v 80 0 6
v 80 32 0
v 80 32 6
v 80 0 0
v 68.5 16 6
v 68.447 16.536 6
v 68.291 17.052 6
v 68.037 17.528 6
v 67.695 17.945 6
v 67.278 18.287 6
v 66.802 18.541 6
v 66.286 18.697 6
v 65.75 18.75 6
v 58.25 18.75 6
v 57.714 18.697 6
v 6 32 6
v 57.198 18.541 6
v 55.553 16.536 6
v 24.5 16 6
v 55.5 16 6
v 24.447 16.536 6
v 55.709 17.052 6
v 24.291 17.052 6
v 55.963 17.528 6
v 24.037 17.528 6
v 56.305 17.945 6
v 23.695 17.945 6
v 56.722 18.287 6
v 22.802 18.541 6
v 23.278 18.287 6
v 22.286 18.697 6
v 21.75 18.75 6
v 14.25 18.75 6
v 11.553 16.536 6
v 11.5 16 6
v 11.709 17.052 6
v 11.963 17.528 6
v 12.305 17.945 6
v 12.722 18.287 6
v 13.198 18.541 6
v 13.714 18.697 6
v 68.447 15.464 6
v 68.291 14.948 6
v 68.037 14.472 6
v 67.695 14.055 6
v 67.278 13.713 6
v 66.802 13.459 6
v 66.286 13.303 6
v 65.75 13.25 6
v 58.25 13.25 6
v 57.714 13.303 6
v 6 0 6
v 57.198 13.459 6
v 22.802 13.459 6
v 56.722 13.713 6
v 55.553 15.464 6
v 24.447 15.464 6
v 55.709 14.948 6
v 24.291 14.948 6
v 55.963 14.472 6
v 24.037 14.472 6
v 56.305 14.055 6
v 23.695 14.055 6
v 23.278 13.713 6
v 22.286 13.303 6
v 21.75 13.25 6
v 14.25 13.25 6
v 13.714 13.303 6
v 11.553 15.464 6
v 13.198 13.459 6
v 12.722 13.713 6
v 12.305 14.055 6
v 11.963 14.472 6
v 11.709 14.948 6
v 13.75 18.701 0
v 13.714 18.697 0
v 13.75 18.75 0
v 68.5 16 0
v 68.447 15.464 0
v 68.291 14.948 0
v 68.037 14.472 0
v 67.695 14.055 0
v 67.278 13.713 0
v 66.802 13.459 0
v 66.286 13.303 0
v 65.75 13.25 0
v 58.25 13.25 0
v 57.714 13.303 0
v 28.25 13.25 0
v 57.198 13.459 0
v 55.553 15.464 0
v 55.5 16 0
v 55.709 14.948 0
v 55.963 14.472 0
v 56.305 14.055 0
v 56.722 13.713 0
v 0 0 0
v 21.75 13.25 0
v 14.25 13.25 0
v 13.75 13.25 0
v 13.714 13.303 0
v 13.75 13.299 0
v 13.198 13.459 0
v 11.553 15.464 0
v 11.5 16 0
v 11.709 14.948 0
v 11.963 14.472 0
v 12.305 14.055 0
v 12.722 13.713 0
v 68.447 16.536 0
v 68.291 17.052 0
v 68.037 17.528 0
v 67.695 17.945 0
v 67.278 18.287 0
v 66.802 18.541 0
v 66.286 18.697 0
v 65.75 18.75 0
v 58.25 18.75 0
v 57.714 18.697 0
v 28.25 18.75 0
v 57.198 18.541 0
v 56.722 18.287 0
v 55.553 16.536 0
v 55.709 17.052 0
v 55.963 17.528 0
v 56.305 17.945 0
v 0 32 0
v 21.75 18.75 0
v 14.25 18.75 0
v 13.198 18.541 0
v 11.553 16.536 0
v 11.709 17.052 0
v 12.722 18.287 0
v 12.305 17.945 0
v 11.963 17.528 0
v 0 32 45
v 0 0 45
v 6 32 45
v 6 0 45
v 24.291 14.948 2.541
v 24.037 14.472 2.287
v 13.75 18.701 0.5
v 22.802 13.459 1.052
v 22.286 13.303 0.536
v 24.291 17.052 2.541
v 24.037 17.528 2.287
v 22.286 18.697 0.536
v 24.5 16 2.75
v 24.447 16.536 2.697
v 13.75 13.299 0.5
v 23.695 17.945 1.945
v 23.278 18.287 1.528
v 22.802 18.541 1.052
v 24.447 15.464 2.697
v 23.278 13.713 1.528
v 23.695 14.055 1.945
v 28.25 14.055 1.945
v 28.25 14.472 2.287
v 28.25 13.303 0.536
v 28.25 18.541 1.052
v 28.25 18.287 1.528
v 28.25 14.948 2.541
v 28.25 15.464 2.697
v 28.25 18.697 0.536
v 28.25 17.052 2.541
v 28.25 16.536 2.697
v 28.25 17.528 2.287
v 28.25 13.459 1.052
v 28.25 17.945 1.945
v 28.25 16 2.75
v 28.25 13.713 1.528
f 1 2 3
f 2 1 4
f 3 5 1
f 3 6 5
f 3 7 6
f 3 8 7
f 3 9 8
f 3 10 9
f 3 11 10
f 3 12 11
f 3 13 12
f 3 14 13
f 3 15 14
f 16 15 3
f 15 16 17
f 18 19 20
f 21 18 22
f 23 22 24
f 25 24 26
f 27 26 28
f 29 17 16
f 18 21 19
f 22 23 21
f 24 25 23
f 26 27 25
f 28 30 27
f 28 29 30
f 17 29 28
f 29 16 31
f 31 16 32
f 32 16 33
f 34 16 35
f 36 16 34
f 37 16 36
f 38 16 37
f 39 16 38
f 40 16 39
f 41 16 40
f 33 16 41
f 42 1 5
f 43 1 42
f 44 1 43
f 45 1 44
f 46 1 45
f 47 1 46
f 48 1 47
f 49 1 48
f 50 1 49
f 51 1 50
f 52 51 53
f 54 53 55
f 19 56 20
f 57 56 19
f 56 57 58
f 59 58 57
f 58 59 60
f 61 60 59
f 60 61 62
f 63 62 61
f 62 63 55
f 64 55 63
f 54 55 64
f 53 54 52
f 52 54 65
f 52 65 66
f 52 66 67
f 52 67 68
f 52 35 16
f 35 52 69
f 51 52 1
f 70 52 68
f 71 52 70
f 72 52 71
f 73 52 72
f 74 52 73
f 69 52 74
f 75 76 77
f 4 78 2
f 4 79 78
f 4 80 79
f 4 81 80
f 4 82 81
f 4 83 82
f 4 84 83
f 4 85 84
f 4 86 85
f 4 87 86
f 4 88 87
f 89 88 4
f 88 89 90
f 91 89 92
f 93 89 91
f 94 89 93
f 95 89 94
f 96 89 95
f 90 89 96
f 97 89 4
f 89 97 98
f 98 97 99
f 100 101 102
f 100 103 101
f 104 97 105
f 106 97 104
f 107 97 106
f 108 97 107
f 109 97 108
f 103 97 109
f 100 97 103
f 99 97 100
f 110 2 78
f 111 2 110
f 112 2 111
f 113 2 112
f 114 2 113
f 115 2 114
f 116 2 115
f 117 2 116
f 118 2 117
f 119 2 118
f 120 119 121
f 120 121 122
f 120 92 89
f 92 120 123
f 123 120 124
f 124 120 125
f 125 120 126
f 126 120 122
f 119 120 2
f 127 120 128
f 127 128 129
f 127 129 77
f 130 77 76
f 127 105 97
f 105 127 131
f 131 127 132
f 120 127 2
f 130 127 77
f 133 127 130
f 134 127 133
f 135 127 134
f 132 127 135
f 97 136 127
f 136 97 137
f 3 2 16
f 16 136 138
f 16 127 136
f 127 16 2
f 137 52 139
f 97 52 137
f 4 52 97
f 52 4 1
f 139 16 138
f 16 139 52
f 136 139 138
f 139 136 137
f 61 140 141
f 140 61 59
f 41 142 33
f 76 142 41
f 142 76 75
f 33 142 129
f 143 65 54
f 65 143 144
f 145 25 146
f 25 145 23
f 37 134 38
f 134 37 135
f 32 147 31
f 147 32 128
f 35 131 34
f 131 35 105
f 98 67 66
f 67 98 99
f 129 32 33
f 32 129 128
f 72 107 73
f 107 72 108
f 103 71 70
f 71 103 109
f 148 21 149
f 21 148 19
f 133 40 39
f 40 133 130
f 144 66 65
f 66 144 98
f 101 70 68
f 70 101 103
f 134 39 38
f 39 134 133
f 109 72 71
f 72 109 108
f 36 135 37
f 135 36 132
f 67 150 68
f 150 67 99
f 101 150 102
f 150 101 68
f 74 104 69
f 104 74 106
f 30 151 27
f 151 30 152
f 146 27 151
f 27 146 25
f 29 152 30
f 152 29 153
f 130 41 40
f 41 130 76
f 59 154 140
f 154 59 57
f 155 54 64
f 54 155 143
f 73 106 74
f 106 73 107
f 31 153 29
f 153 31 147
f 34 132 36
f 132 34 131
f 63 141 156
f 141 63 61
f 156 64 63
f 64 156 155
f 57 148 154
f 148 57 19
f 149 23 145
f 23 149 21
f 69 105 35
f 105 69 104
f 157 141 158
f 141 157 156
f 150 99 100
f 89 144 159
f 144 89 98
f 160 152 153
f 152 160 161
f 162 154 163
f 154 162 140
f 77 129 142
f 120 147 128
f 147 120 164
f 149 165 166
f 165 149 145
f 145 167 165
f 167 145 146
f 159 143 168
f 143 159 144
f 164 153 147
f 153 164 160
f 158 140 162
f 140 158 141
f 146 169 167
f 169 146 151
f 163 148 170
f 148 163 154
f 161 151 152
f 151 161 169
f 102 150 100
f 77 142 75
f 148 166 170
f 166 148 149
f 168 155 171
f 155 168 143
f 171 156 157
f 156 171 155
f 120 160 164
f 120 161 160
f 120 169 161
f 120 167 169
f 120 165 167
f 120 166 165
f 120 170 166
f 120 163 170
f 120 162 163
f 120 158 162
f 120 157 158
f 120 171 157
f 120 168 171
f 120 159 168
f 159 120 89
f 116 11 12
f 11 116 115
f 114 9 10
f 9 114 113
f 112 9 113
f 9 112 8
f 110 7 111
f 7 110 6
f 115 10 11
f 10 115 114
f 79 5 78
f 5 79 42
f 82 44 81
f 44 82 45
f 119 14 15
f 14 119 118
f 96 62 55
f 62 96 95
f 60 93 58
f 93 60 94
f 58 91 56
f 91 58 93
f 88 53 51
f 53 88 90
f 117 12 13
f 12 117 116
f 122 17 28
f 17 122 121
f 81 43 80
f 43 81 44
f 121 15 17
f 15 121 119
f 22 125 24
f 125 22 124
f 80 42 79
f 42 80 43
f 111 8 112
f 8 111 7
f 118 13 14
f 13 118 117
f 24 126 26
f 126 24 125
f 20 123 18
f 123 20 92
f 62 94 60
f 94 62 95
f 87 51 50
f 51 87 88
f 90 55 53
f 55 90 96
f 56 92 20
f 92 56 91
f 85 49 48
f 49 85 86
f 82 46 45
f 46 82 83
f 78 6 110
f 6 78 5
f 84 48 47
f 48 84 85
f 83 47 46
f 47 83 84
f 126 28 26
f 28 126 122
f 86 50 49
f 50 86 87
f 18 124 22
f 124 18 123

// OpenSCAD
$fn = 32;

// ----------------------------------------------------------------------
// L-bracket: 80 x 32 x 45 mm
// ----------------------------------------------------------------------

// --- parameters (mm) ---
arm_x = 80;               // horizontal leg, X
arm_z = 45;               // vertical leg, Z
width = 32;               // bracket depth, Y
wall = 6;                 // plate thickness
hole_d = 9;               // clearance for M8
slot_w = 5.5;             // euro screw slot width
slot_l = 13;              // euro screw slot length

module hole_z(px, py) {
  translate([px, py, -0.5]) cylinder(h = wall + 1, d = hole_d);
}
module hole_x(pz, py) {
  translate([-0.5, py, pz]) rotate([0, 90, 0]) cylinder(h = wall + 1, d = hole_d);
}
module euro_slot_z(px, py) {
  hull() {
    translate([px - (slot_l - slot_w) / 2, py, -0.5]) cylinder(h = wall + 1, d = slot_w);
    translate([px + (slot_l - slot_w) / 2, py, -0.5]) cylinder(h = wall + 1, d = slot_w);
  }
}
module euro_slot_x(pz, py) {
  translate([-0.5, 0, 0]) rotate([0, 90, 0]) hull() {
    translate([0, py, pz - (slot_l - slot_w) / 2]) cylinder(h = wall + 1, d = slot_w);
    translate([0, py, pz + (slot_l - slot_w) / 2]) cylinder(h = wall + 1, d = slot_w);
  }
}

difference() {
  union() {
    /* horizontal leg */
    cube([arm_x, width, wall]);
    /* vertical leg, overlapping the corner block */
    cube([wall, width, arm_z]);
  }
  euro_slot_z(18, 16);
  euro_slot_x(18, 16);
  euro_slot_z(62, 16);
}
